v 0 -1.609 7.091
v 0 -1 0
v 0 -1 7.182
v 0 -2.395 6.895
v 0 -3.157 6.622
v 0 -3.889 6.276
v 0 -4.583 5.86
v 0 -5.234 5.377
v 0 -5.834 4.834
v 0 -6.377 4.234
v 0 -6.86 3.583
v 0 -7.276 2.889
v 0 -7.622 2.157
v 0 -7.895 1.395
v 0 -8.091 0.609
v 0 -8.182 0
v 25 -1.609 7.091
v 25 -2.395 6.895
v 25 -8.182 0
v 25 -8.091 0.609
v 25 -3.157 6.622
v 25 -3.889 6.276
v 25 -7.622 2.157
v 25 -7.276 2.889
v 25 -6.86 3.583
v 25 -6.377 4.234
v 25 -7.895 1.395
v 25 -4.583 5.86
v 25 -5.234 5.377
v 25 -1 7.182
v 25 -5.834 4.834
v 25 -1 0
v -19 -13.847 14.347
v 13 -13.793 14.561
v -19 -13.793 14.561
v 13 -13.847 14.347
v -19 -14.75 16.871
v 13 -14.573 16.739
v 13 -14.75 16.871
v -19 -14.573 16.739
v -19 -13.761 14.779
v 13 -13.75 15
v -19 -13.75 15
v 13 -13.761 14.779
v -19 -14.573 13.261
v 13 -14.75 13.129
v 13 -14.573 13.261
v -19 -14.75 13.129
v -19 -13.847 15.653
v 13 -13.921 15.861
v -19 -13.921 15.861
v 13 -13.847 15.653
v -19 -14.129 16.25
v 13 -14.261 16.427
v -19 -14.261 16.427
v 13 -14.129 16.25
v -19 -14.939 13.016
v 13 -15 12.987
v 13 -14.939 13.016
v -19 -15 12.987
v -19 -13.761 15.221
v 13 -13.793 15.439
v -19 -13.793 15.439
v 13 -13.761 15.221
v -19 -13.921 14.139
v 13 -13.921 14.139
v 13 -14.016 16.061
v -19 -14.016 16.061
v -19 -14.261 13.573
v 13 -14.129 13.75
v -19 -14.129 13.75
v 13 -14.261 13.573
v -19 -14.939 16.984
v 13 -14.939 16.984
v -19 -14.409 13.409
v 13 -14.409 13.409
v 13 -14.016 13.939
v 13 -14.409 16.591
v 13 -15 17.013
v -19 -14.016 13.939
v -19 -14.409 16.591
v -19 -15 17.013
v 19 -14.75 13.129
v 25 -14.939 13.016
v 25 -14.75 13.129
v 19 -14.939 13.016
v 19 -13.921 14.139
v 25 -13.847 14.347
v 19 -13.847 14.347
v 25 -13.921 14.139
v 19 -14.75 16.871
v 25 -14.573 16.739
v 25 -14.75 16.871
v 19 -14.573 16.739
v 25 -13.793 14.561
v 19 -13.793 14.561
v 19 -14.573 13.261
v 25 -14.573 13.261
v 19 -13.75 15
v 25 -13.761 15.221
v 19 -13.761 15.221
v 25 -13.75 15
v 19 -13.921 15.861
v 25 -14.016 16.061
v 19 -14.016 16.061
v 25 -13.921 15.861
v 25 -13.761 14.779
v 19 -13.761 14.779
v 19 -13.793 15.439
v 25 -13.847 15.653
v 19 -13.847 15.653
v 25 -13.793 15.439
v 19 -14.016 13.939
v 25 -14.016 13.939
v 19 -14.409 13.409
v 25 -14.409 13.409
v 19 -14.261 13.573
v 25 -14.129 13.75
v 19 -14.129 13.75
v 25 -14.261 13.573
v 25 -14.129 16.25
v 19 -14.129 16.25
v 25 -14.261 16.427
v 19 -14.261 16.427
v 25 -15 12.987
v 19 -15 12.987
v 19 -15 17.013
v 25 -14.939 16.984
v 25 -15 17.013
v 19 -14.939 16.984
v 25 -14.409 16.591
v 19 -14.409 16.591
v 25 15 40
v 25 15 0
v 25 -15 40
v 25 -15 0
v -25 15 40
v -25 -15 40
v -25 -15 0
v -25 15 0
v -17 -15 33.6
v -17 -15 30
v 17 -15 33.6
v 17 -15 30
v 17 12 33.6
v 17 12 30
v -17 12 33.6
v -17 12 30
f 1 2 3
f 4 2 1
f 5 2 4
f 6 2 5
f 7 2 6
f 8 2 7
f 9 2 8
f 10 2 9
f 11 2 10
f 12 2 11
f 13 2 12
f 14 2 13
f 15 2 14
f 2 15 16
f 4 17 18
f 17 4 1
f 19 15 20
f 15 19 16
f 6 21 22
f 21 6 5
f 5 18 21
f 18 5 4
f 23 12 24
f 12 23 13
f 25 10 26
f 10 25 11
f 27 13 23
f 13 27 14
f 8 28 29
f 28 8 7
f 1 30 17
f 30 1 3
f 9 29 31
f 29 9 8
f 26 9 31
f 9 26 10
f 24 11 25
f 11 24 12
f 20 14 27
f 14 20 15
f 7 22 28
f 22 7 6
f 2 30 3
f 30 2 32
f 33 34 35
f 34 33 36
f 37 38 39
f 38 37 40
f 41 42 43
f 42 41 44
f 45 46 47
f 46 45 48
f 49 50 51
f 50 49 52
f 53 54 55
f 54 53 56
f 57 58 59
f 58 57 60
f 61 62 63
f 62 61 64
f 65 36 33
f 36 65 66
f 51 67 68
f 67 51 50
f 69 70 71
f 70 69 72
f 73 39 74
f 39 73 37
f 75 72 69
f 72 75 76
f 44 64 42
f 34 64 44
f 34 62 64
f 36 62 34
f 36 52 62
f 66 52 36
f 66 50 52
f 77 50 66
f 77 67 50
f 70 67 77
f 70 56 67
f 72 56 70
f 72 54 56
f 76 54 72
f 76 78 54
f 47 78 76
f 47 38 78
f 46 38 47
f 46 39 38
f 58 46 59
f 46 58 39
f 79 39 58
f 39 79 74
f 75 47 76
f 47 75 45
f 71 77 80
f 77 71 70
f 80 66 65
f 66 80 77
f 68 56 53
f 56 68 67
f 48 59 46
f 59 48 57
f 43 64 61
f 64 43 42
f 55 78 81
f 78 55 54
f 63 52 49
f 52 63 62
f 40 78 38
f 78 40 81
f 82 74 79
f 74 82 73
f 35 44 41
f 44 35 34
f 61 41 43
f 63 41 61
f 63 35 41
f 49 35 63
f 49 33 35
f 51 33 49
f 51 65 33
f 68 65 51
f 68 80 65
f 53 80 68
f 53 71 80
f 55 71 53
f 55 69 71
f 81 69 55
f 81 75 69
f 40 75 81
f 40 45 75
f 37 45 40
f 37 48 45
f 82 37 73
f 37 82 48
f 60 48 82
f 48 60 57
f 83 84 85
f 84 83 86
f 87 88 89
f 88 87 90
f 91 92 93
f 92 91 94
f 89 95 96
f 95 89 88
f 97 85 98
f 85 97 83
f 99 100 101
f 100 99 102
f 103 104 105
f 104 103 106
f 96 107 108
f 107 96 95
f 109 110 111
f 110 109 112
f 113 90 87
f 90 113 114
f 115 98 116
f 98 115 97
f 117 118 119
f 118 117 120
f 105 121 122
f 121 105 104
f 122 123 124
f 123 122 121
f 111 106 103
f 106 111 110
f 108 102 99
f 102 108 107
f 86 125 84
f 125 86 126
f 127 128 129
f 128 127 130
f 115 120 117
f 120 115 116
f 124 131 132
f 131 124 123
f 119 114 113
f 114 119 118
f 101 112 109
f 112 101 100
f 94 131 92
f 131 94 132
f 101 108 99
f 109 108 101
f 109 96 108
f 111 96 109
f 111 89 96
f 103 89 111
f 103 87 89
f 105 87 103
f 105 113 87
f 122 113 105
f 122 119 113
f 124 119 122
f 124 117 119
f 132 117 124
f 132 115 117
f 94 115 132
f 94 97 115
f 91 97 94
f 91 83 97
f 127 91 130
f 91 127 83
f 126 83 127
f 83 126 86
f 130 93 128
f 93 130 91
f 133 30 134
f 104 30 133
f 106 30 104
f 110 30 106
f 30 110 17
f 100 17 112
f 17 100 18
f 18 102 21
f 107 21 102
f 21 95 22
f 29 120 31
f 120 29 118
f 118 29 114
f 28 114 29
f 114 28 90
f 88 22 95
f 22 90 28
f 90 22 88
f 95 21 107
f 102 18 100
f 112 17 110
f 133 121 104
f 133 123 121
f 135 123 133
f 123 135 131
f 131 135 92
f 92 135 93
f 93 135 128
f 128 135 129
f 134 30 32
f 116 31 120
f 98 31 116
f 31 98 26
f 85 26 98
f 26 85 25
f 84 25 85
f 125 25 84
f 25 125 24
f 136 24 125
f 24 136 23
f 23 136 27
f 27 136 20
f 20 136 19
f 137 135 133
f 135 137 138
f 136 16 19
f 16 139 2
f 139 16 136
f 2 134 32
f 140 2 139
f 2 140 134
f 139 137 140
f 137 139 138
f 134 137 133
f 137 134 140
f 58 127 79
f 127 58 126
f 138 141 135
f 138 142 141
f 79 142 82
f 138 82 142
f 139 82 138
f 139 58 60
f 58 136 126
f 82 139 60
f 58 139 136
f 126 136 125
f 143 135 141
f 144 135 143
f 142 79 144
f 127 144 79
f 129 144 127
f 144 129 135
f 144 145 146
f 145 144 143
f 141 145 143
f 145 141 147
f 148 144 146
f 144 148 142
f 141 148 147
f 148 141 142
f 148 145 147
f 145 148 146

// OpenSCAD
// Wall-mounted syringe holder for 10mL syringe
// Corrected geometry based on measurement report and specification.

// --- Dimensions ---
block_w      = 50.0;    // Block width (X)
block_d      = 30.0;    // Block depth (Y)
block_h      = 40.0;    // Block height (Z)

barrel_dia   = 16.5;    // Diameter of the syringe barrel channel
barrel_rad   = barrel_dia / 2;

flange_w      = 34.0;    // Width of the flange slot (X)
flange_h      = 2.6;     // Height of the flange slot (Z)
flange_z_min  = 30.0;    // Bottom of the flange slot (Z)
flange_y_end  = 11.0;    // How far back the slot goes (Y)

screw_hole_d  = 4.5;     // Diameter for M4 screws
screw_x_pos   = 19.0;    // X offset for screw holes
screw_z_pos   = 15.0;    // Z height for screw holes

$fn = 64;

// --- Modeling ---

difference() {
    // 1. The main block
    // Centered on X and Y, sitting on Z=0.
    // X: [-25, 25], Y: [-15, 15], Z: [0, 40]
    translate([-block_w/2, -block_d/2, 0])
        cube([block_w, block_d, block_h]);

    // 2. The barrel channel
    // Specification: "back end is a half-circle of 8.25mm radius centred at x=0, y=0"
    // "straight sides run forward to the front face (y = -15)"
    // This describes a semi-cylinder whose flat face is at y=0 and curved part is at y=-8.25.
    // The cylinder axis is along Y.
    
    // First, create the semi-cylinder by taking a cylinder and cutting it in half.
    // We place the cylinder such that its center axis is at x=0, y=0.
    // To make it a "half-circle" at the back (y=0), we use a cube to cut the cylinder.
    translate([0, 0, -1]) // Extend slightly in Z
    rotate([0, 90, 0])    // Rotate to align axis with Y
    difference() {
        cylinder(h = block_d + 2, d = barrel_dia);
        // Cut the cylinder in half. 
        // The specification says the "back end" (the end of the hole) is a half-circle at y=0.
        // This implies the channel occupies the space from y=-15 to y=0.
        // To achieve this, we subtract the part of the cylinder where y > 0.
        translate([-barrel_rad, -1, -1])
            cube([barrel_dia * 2, barrel_rad + 2, block_h + 2]);
    }

    // 3. The flange slot
    // Width 34mm (X), Height 2.6mm (Z), from front face (y=-15) to y=11.
    translate([-flange_w/2, -block_d/2 - 1, flange_z_min])
        cube([flange_w, (flange_y_end - (-block_d/2)) + 2, flange_h + 1]);

    // 4. The screw holes
    // Two 4.5mm holes through the block along the Y axis at x = +/- 19, z = 15.
    for (sx = [-screw_x_pos, screw_x_pos]) {
        translate([sx, -block_d/2 - 1, screw_z_pos])
            rotate([0, 90, 0])
                cylinder(h = block_d + 2, d = screw_hole_d);
    }
}
